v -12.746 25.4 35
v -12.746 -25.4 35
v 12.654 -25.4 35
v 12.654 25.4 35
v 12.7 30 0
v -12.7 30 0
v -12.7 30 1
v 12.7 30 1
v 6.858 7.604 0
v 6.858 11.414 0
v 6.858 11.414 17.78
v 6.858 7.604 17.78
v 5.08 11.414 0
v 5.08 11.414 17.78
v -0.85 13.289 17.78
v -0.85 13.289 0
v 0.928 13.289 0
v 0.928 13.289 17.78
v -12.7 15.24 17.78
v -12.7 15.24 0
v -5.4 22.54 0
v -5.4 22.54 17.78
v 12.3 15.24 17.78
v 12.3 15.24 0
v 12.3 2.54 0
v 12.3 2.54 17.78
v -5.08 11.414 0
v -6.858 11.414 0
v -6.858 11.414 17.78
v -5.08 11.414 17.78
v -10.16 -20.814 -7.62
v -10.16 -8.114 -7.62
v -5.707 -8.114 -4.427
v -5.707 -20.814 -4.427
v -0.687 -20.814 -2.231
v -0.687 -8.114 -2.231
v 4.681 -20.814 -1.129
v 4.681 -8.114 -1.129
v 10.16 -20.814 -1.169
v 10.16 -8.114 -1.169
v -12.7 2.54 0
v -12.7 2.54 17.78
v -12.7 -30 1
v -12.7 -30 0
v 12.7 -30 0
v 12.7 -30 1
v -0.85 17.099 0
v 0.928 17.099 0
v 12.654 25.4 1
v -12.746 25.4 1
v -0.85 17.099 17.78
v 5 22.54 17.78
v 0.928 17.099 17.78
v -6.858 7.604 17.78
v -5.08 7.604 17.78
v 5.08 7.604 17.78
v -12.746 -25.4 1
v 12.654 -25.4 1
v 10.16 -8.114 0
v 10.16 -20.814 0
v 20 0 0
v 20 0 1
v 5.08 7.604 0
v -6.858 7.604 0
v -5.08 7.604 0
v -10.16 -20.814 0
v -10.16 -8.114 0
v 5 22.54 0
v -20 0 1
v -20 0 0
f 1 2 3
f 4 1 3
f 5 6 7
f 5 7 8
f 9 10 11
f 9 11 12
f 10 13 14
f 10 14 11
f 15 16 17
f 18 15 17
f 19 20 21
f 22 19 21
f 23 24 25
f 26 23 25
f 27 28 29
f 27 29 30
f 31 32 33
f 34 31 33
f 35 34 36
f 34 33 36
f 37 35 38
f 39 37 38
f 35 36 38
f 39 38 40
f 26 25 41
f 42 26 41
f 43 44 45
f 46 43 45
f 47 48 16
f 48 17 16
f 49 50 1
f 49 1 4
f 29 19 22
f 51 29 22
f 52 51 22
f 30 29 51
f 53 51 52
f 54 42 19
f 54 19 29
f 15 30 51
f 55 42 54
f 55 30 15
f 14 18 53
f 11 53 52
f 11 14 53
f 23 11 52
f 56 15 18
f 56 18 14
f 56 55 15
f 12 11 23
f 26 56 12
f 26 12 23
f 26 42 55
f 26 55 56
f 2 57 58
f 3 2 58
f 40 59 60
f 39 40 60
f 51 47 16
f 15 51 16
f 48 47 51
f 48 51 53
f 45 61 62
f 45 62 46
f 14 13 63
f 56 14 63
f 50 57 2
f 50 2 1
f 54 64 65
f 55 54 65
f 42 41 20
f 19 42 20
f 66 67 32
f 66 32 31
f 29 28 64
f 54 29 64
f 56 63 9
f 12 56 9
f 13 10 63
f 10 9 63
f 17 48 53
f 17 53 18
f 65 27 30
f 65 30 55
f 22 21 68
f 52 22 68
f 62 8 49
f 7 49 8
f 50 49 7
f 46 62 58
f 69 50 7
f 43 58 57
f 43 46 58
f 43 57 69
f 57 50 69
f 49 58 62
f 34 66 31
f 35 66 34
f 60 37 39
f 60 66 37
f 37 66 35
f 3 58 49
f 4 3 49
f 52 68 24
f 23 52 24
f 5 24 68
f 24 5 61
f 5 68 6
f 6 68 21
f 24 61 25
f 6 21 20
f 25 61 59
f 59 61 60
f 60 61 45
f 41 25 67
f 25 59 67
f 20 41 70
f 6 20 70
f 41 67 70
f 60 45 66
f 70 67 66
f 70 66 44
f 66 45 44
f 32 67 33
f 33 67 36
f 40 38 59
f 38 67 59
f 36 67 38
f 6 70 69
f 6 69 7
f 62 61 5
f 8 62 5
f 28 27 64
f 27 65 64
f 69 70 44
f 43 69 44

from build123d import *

# Parameters (mm, degrees)
F1_DEPTH  = 1
F4_W      = 25.4
F4_H      = 50.8
F5_DEPTH  = 34
F6_W      = 1.778
F6_H      = 3.81
F7_DEPTH  = 17.78
F8_W      = 20.32
F8_H      = 12.7
F9_DEPTH  = 7.62
F11_DEPTH = 25.4


with BuildPart() as f1:
    # F0 (on Top) → F1 (new body)
    with BuildSketch(Plane.XY):
        Polygon((12.7, 30), (0, 30), (0, 0), (20, 0), align=None)
    extrude(amount=F1_DEPTH)

    # F2: F1 across plane


with BuildPart() as f1_1:
    add(f1.part)
    add(f1.part.mirror(Plane.XZ))

    # F3: F1 across plane


with BuildPart() as f1_2:
    add(f1_1.part)
    add(f1_1.part.mirror(Plane.YZ))

    # F4 (on face) → F5 (join)
    with BuildSketch(Plane.XY.offset(1)):
        with Locations((-0.045811, 0)):
            Rectangle(F4_W, F4_H)
    extrude(amount=F5_DEPTH)

    # F6 (on face) → F7 (cut)
    with BuildSketch(Plane(origin=(0, 0, 0), x_dir=(1, 0, 0), z_dir=(0, 0, -1))):
        Polygon((-5.4, -22.54), (5, -22.54), (12.3, -15.24), (12.3, -2.54), (-12.7, -2.54), (-12.7, -15.24), align=None)
        with Locations((-5.969, -9.508814)):
            Rectangle(F6_W, F6_H, mode=Mode.SUBTRACT)
        with Locations((0.038805, -15.194196)):
            Rectangle(F6_W, F6_H, mode=Mode.SUBTRACT)
        with Locations((5.969, -9.508814)):
            Rectangle(F6_W, F6_H, mode=Mode.SUBTRACT)
    extrude(amount=-F7_DEPTH, mode=Mode.SUBTRACT)

    # F8 (on face) → F9 (join)
    with BuildSketch(Plane(origin=(0, 0, 0), x_dir=(1, 0, 0), z_dir=(0, 0, -1))):
        with Locations((0, 14.463713)):
            Rectangle(F8_W, F8_H)
    extrude(amount=F9_DEPTH)

    # F10 (on face) → F11 (cut)
    with BuildSketch(Plane(origin=(0, -8.113713, 0), x_dir=(-1, 0, 0), z_dir=(0, 1, 0))):
        Polygon((10.16, -7.62), (-10.16, -1.168574), (-10.16, -7.62), align=None)
        with BuildLine():
            ThreePointArc((10.16, -7.62), (0.686877, -2.230835), (-10.16, -1.168574))
            Line((-10.16, -1.168574), (10.16, -7.62))
        make_face()
    extrude(amount=-F11_DEPTH, mode=Mode.SUBTRACT)


solid = f1_2.part
